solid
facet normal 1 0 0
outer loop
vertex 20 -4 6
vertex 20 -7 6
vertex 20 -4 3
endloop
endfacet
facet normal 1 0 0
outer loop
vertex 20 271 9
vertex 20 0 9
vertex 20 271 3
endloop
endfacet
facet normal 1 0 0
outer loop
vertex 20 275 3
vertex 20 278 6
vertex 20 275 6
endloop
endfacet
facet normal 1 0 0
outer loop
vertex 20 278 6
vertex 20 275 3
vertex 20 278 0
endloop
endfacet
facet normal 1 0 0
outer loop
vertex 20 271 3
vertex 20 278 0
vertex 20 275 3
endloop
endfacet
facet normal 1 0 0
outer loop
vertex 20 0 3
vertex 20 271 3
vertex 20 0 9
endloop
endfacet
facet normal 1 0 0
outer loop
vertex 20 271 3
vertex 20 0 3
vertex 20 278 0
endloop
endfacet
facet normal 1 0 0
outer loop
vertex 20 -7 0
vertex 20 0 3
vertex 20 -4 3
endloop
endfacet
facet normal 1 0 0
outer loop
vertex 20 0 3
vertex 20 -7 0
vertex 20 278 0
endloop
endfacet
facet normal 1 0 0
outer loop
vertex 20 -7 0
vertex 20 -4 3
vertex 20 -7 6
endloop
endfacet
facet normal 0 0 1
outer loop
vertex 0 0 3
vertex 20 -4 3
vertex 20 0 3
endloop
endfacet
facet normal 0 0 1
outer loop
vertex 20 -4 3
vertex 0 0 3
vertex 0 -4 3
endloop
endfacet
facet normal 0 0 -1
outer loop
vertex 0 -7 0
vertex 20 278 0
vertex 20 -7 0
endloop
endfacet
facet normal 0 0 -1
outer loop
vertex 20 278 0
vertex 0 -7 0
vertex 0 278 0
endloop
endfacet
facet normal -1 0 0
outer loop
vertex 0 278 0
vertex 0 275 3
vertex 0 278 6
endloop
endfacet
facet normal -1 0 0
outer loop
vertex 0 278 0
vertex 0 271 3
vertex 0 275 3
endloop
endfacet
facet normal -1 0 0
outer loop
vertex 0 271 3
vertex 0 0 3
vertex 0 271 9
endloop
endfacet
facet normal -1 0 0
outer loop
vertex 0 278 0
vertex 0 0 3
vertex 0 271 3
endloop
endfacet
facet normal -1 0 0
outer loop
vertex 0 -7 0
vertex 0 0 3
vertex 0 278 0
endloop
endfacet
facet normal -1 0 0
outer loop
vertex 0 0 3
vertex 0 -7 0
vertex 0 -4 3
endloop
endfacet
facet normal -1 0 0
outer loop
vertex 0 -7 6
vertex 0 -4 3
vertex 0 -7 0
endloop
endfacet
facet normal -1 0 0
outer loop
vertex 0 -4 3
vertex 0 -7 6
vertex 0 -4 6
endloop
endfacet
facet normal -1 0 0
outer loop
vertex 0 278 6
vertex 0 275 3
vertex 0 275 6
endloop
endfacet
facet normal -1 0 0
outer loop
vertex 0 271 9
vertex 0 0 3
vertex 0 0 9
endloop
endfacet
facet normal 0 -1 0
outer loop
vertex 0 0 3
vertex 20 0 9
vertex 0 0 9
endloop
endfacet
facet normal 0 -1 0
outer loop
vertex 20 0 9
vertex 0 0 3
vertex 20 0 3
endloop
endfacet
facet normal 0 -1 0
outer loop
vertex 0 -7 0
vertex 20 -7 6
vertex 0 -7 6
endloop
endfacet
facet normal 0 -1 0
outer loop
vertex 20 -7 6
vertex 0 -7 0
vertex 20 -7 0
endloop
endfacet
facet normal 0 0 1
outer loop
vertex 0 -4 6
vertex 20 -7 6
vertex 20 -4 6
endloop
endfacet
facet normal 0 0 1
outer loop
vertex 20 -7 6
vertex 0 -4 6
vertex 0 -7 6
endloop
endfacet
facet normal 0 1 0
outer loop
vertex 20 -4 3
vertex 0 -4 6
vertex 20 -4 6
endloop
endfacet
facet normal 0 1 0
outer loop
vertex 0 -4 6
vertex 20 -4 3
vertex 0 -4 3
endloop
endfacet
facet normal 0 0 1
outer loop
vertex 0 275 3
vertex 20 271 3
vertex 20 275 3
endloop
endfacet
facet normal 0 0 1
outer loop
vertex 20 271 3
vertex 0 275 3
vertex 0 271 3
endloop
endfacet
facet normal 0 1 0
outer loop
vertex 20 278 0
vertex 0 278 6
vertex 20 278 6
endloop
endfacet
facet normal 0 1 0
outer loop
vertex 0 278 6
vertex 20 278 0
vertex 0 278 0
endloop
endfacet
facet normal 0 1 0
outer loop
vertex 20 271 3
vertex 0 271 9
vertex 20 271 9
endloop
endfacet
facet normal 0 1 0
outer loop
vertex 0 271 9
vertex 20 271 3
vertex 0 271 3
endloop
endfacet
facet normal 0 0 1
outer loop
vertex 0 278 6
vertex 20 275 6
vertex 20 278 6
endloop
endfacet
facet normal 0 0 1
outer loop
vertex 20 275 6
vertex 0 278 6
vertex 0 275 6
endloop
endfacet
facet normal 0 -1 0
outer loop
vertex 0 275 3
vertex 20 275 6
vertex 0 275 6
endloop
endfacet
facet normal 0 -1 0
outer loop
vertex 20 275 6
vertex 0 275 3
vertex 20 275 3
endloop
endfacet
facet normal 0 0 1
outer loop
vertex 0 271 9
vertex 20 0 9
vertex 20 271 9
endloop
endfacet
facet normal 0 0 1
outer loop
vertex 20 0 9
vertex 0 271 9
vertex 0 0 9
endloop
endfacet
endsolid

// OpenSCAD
//################# brace in one piece ###############################
//- all numbers in mm
//####################################################################

// suitable for MacBook Pro (Retina, 13-inch, Early 2015)
//--------------- CHANGE THIS VALUE FOR YOUR COMPUTER ---------------|
overall_distance_between_pcFoots=315;                              //|
//___________________________________________________________________|

// calculating the value needed for translation, assuming standLeft and standRight have w=30mm and the connectors are 7mm each
translation_value = overall_distance_between_pcFoots - 30 - 14;
//Definition of needed Modules

// left connector
module left(){
  translate([0,-7,0]) cube([20,7,3],false);// bottom
  translate([0,-7,3]) cube([20,3,3],false);// outer tooth
}
// right connector
module right(x){
  translate([0,x,0]) cube([20,7,3],false);// bottom
  translate([0,x+4,3]) cube([20,3,3],false);// outer tooth
}

// instantiating modules
// color helps to identify different modules in preview
union(){
    translate([0,0,0]) cube([20,translation_value,9],false);// main part
    color("blue") left();// left connector
    color("blue") right(translation_value);// right connector
}
